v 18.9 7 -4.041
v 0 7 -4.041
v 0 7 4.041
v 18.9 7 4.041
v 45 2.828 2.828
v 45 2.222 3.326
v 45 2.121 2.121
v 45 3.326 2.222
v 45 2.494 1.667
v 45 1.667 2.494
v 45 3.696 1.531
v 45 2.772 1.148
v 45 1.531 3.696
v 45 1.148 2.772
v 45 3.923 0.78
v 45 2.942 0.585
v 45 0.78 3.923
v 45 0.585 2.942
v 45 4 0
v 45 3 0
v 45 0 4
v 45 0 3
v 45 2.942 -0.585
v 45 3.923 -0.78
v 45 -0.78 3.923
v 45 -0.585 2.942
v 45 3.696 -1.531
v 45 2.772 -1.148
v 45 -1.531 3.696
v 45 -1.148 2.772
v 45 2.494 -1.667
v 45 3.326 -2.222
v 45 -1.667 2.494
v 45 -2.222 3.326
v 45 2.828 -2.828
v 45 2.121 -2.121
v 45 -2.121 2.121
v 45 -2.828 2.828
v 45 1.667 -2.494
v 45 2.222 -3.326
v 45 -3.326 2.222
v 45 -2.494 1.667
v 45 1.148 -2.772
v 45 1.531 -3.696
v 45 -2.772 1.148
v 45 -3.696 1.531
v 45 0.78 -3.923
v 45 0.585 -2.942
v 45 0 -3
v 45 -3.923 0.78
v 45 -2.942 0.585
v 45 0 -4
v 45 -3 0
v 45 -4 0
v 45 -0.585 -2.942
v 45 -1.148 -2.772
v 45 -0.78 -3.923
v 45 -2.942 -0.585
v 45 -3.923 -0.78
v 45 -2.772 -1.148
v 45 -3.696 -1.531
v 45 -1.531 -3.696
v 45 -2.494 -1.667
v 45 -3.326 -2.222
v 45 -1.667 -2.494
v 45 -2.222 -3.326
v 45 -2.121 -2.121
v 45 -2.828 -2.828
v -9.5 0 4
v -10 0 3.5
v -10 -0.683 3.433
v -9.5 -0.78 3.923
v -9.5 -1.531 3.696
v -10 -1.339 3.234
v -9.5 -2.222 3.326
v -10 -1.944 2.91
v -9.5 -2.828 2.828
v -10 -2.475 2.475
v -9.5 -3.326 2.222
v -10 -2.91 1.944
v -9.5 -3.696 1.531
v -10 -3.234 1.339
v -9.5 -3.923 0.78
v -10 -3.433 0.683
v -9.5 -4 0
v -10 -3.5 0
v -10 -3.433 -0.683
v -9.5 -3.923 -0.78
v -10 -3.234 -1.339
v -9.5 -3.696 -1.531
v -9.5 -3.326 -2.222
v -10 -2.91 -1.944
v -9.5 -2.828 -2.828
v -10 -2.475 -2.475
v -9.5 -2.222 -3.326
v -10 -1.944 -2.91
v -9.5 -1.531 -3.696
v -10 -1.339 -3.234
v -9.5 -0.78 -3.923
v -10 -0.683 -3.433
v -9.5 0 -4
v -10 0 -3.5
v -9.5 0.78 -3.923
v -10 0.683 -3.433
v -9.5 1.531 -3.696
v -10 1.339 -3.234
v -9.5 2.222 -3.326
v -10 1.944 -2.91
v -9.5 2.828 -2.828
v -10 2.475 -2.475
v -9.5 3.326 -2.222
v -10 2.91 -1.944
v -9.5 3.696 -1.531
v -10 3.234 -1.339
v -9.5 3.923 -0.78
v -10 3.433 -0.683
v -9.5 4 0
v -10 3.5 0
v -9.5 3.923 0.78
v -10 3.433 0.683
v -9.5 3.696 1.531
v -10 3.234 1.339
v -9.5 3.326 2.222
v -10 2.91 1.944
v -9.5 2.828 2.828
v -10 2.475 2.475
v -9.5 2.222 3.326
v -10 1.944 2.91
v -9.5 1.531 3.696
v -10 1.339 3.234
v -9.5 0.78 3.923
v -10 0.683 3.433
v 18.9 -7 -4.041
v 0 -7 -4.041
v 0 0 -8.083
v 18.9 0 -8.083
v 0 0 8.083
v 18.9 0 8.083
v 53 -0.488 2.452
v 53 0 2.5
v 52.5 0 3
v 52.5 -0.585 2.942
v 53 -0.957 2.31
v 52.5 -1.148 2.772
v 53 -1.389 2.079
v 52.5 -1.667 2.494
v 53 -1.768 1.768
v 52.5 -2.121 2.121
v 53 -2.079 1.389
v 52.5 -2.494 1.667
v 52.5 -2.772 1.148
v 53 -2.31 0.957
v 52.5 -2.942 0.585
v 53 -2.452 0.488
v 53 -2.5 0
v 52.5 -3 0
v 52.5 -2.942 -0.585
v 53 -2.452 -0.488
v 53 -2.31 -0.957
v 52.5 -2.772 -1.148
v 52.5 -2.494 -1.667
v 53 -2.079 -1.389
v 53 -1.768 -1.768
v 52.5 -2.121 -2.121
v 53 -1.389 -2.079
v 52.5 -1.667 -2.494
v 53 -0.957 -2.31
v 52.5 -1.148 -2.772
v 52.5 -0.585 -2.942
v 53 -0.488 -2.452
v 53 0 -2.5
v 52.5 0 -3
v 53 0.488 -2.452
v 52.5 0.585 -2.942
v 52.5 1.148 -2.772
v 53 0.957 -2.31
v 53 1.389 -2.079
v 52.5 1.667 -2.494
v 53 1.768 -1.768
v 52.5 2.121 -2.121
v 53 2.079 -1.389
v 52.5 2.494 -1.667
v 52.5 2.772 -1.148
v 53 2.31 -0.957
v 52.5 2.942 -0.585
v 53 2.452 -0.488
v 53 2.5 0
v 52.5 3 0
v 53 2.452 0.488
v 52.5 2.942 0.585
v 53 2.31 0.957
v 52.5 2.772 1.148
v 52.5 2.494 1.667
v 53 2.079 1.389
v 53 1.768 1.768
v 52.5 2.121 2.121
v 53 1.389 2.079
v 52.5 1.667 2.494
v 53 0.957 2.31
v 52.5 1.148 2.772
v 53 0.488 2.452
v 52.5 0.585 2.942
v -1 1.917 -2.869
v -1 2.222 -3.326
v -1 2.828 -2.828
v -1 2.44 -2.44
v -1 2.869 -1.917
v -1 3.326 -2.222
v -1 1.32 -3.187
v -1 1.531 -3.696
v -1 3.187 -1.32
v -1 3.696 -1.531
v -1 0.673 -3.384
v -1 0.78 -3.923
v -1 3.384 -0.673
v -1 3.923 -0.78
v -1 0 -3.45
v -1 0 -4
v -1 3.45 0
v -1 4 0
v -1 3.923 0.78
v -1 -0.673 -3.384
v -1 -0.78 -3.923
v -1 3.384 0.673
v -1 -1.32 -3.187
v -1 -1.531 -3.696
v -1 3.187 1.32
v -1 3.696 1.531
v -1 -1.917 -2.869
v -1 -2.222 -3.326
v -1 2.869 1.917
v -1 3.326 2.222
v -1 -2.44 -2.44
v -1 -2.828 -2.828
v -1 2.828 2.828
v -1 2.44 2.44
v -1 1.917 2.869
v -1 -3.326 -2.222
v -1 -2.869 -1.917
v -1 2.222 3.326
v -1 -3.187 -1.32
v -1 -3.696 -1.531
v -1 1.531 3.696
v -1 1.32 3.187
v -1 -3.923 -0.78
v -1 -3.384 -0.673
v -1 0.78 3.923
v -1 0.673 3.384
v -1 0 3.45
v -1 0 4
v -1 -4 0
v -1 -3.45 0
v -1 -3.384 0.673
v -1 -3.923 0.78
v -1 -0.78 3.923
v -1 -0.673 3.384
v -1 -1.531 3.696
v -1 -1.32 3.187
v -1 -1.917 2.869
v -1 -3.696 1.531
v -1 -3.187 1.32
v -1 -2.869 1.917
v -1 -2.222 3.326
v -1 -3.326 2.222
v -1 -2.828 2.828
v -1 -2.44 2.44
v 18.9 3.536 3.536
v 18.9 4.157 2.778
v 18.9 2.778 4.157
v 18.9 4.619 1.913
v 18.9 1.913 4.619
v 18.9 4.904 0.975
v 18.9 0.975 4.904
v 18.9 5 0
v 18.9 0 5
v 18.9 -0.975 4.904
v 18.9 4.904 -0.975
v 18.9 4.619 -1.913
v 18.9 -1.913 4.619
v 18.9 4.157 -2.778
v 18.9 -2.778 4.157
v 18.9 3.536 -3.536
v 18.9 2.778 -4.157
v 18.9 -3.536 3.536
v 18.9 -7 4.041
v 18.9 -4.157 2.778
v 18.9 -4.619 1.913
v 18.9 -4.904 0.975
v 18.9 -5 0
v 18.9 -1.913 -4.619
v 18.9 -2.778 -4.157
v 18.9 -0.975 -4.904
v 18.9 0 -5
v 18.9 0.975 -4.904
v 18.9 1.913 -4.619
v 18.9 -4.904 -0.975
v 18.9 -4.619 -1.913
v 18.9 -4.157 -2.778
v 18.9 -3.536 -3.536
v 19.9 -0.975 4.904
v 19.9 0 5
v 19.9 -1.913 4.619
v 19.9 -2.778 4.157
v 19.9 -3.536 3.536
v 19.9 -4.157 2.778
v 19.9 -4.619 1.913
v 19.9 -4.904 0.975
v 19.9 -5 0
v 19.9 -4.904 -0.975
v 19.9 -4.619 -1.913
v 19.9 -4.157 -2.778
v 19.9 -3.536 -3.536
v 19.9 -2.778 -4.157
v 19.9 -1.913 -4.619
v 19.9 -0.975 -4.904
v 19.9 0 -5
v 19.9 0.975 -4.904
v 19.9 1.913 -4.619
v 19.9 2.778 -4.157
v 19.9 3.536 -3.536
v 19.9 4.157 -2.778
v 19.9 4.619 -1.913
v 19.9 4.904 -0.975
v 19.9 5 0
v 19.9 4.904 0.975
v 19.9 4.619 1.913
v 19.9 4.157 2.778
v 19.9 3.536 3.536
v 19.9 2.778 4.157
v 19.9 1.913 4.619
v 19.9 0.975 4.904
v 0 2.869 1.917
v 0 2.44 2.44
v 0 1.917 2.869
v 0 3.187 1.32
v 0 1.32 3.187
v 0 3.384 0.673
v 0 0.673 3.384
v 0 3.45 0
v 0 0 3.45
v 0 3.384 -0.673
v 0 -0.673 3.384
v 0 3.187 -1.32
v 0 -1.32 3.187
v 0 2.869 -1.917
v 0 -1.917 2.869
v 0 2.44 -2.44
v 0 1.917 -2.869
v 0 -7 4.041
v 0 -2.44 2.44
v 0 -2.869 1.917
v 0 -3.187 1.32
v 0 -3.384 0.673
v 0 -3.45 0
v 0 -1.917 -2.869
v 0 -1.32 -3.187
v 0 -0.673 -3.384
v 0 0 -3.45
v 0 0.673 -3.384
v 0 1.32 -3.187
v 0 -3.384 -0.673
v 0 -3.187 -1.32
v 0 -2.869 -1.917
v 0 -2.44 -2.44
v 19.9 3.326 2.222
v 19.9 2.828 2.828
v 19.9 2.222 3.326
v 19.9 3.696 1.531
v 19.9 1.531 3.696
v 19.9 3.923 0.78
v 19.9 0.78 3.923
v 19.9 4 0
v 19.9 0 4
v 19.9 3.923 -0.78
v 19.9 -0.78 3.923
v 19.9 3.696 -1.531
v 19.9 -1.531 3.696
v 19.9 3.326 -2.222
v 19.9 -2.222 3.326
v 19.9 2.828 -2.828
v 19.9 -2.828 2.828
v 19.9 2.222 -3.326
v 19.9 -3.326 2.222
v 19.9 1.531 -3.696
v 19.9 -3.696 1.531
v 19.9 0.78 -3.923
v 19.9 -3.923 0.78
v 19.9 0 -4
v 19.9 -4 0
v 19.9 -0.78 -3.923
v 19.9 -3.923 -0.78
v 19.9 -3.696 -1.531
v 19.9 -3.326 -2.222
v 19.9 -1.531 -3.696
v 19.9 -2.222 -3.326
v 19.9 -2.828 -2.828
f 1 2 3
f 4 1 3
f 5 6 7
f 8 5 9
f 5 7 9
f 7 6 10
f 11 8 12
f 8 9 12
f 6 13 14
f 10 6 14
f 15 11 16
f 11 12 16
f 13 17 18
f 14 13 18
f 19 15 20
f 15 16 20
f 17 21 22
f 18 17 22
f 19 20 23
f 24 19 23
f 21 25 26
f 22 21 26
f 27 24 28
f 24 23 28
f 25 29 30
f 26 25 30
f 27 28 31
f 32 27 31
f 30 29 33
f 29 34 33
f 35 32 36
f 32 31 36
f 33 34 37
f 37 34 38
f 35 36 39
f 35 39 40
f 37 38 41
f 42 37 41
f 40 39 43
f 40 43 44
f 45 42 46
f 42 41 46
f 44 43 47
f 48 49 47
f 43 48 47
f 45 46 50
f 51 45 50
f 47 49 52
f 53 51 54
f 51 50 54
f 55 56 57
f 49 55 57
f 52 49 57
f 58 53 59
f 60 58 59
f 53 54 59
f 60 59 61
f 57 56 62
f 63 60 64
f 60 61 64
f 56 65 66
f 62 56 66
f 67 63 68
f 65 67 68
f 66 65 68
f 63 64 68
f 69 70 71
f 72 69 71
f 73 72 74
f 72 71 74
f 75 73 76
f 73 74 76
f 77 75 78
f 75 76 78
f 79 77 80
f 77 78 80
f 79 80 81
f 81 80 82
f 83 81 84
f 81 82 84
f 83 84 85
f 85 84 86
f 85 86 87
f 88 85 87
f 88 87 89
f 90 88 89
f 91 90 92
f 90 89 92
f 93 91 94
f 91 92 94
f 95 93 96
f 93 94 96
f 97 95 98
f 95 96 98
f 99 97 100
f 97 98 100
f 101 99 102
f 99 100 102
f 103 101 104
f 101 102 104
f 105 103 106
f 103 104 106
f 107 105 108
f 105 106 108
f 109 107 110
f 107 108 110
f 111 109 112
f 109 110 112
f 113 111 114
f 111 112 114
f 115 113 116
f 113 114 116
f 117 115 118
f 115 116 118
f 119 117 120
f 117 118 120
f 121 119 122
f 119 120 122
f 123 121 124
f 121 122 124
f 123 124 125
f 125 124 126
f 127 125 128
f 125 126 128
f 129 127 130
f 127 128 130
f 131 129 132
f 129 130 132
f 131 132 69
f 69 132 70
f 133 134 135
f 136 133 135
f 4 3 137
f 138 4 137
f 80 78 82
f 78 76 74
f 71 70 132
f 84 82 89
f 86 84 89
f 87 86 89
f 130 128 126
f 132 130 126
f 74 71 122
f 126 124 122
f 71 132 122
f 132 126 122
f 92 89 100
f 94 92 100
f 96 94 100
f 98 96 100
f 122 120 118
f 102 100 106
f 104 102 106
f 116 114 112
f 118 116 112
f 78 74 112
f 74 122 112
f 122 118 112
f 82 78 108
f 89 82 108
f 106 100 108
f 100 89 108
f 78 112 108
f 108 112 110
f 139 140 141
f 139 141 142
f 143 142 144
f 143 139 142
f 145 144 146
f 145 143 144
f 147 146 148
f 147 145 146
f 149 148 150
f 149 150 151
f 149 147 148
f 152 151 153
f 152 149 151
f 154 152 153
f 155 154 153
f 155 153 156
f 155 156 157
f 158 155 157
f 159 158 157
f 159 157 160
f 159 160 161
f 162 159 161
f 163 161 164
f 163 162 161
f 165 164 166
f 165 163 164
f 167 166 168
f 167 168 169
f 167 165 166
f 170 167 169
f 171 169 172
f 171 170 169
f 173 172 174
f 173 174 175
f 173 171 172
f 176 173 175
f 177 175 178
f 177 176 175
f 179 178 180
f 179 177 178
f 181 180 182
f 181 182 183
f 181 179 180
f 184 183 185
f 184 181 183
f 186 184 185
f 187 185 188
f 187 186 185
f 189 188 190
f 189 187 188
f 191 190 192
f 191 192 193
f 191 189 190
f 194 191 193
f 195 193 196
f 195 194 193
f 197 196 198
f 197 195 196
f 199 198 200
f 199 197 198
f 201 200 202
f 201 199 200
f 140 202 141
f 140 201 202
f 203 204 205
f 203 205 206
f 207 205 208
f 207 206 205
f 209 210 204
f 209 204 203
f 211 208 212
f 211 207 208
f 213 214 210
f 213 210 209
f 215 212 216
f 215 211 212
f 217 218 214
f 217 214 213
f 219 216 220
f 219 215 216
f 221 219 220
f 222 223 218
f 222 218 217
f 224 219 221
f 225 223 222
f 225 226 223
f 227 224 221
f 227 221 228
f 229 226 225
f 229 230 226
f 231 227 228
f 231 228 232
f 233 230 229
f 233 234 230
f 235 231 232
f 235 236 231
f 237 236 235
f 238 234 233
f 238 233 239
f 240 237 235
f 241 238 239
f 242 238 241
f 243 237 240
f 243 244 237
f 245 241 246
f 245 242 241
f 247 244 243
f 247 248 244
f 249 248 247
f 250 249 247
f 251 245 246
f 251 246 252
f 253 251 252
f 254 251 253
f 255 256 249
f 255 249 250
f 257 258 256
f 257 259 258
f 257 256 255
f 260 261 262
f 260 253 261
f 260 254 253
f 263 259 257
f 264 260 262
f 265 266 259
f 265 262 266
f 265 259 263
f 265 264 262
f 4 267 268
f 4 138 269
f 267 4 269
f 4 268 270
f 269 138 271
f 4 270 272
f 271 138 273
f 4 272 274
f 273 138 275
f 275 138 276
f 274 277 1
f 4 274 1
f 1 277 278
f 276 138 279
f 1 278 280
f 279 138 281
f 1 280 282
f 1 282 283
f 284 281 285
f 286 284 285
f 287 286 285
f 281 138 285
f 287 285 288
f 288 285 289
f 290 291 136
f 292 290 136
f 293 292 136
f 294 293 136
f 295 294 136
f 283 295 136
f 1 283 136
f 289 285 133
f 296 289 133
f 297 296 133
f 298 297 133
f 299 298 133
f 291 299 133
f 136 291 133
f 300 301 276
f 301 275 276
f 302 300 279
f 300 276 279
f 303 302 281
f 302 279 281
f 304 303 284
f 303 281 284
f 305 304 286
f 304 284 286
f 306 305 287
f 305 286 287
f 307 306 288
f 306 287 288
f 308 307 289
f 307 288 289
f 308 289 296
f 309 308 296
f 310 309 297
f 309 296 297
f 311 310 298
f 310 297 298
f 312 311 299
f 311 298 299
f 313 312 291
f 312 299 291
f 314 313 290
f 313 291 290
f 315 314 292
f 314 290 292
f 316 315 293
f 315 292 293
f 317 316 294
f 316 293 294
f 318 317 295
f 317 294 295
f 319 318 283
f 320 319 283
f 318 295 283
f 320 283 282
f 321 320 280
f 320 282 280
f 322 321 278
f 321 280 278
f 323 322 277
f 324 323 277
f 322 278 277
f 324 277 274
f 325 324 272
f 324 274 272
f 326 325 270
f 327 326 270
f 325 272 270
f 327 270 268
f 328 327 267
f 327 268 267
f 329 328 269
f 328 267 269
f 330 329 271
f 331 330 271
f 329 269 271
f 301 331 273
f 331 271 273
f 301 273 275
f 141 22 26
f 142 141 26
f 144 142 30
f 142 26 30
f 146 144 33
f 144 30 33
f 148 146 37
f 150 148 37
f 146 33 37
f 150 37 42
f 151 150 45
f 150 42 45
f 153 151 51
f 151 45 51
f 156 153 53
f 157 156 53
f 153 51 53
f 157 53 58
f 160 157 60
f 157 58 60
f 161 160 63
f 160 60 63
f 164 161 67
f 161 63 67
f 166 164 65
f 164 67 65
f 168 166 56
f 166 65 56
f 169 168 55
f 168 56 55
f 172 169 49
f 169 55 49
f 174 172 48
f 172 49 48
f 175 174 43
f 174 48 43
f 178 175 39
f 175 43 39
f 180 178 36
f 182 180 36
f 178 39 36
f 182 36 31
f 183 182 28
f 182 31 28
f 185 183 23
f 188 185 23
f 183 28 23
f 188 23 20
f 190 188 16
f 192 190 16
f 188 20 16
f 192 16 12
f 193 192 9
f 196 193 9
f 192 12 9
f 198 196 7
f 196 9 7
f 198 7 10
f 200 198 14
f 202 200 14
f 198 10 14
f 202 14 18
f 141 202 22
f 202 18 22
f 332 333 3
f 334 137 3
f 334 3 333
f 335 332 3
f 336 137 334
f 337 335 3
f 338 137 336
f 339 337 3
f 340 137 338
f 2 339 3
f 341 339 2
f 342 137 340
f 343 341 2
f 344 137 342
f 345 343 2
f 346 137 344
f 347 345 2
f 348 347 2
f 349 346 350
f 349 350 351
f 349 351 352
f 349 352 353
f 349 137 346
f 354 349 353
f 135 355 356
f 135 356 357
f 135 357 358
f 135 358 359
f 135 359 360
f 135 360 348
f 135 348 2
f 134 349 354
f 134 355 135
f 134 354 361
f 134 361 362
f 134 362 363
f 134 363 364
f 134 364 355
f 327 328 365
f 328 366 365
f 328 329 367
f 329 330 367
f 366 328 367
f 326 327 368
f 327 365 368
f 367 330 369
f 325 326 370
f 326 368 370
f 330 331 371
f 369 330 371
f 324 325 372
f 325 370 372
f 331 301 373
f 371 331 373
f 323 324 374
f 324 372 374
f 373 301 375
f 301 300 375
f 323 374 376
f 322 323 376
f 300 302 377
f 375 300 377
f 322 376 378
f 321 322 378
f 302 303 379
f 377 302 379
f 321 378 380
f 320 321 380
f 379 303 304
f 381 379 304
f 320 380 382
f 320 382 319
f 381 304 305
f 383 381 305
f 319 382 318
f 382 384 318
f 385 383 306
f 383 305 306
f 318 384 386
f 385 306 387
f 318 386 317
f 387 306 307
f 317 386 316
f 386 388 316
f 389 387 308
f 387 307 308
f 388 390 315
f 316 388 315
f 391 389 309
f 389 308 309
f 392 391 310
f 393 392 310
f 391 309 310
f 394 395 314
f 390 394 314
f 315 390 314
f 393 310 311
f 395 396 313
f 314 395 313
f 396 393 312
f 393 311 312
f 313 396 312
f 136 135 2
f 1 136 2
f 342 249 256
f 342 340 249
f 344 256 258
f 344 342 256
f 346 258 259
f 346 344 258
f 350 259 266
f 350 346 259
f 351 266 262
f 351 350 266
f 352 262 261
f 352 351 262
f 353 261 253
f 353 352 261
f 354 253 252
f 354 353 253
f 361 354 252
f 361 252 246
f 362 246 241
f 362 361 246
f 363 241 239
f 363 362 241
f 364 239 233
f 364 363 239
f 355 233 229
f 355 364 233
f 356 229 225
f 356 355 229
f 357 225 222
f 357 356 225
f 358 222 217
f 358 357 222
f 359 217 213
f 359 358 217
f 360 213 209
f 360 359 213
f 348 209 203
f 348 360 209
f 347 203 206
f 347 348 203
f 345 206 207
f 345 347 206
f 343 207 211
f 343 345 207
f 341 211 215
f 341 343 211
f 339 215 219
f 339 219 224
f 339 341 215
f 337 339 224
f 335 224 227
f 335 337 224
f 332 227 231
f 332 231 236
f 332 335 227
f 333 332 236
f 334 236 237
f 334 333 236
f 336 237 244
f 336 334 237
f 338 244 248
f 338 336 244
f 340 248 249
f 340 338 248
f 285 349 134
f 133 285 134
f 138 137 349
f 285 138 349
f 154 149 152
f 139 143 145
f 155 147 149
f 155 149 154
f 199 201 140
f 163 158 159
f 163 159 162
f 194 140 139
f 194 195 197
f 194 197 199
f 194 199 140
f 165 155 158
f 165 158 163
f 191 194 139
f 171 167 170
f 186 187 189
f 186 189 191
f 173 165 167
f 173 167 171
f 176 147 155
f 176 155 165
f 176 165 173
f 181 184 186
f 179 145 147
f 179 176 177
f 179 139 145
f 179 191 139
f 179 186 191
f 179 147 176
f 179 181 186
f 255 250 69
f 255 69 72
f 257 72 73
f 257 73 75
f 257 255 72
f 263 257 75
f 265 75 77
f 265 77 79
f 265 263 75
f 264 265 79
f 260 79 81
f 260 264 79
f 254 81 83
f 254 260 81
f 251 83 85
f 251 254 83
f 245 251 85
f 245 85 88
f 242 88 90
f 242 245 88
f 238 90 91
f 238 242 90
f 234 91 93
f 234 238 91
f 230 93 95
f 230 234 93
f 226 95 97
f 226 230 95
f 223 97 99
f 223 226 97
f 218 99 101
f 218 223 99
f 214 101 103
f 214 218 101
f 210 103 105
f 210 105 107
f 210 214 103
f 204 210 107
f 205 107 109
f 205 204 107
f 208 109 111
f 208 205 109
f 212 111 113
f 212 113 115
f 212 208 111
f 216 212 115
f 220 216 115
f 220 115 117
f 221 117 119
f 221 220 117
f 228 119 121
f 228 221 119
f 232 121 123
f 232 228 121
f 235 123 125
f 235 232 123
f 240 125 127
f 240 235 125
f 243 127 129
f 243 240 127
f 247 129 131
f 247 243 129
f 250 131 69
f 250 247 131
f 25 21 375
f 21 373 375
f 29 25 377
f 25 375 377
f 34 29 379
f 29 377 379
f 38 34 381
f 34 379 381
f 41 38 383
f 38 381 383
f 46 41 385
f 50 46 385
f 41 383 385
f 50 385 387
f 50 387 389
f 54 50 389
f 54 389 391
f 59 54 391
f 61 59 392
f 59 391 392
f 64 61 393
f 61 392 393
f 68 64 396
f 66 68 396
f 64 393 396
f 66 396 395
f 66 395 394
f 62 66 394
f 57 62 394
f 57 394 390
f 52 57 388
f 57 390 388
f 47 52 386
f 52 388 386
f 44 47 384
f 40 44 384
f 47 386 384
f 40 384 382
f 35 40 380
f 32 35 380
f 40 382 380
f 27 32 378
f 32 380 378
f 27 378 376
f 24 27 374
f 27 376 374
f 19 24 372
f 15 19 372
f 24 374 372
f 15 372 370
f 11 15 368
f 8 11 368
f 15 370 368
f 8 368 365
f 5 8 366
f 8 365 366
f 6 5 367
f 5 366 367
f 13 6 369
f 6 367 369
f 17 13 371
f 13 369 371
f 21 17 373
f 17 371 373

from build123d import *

# Parameters (mm, degrees)
BOSS_EXTRUDE1_START = -10
BOSS_EXTRUDE1_DEPTH = 63
CHAMFER1_SIZE       = 0.5


# Read off the part's stored shape, not the designer's step: Boss-Extrude1
with BuildPart() as part:
    # Boss-Extrude1 outline → Boss-Extrude1 (new body)
    with BuildSketch(Plane(origin=(0, 0, 0), x_dir=(0, 0, -1), z_dir=(1, 0, 0)).offset(BOSS_EXTRUDE1_START)):
        Polygon((-4.04145, 6.999996736), (-8.0829, 0), (-4.04145, -6.999996736), (4.04145, -6.999996736), (8.0829, 0), (4.04145, 6.999996736), align=None)
    extrude(amount=BOSS_EXTRUDE1_DEPTH)

    # Sketch2 → Cut-Revolve1 (revolve, cut)
    with BuildSketch(Plane(origin=(0, 0, 0), x_dir=(1, 0, 0), z_dir=(0, 1, 0)), mode=Mode.PRIVATE) as cut_revolve1_sk:
        Polygon((0, 8.0829), (-10, 8.0829), (-10, 4), (-1, 4), (-1, 3.45), (0, 3.45), align=None)
    revolve(cut_revolve1_sk.sketch.rotate(Axis((-12.627683811, 0, 0), (1, 0, 0)), 180), axis=Axis((-12.627683811, 0, 0), (1, 0, 0)), mode=Mode.SUBTRACT)

    # Sketch3 → Cut-Revolve2 (revolve, cut)
    with BuildSketch(Plane(origin=(0, 0, 0), x_dir=(1, 0, 0), z_dir=(0, 1, 0)), mode=Mode.PRIVATE) as cut_revolve2_sk:
        Polygon((53, 8.0829), (53, 3), (45, 3), (45, 4), (19.9, 4), (19.9, 5), (18.9, 5), (18.9, 8.0829), align=None)
    revolve(cut_revolve2_sk.sketch.rotate(Axis((-14.24617289, 0, 0), (1, 0, 0)), 180), axis=Axis((-14.24617289, 0, 0), (1, 0, 0)), mode=Mode.SUBTRACT)

    # Chamfer1
    chamfer1_edges = [part.edges().sort_by_distance(p)[0] for p in [
        (-10, 0, -4),
        (53, 0, -3),
    ]]
    chamfer(chamfer1_edges, length=CHAMFER1_SIZE)


solid = part.part
